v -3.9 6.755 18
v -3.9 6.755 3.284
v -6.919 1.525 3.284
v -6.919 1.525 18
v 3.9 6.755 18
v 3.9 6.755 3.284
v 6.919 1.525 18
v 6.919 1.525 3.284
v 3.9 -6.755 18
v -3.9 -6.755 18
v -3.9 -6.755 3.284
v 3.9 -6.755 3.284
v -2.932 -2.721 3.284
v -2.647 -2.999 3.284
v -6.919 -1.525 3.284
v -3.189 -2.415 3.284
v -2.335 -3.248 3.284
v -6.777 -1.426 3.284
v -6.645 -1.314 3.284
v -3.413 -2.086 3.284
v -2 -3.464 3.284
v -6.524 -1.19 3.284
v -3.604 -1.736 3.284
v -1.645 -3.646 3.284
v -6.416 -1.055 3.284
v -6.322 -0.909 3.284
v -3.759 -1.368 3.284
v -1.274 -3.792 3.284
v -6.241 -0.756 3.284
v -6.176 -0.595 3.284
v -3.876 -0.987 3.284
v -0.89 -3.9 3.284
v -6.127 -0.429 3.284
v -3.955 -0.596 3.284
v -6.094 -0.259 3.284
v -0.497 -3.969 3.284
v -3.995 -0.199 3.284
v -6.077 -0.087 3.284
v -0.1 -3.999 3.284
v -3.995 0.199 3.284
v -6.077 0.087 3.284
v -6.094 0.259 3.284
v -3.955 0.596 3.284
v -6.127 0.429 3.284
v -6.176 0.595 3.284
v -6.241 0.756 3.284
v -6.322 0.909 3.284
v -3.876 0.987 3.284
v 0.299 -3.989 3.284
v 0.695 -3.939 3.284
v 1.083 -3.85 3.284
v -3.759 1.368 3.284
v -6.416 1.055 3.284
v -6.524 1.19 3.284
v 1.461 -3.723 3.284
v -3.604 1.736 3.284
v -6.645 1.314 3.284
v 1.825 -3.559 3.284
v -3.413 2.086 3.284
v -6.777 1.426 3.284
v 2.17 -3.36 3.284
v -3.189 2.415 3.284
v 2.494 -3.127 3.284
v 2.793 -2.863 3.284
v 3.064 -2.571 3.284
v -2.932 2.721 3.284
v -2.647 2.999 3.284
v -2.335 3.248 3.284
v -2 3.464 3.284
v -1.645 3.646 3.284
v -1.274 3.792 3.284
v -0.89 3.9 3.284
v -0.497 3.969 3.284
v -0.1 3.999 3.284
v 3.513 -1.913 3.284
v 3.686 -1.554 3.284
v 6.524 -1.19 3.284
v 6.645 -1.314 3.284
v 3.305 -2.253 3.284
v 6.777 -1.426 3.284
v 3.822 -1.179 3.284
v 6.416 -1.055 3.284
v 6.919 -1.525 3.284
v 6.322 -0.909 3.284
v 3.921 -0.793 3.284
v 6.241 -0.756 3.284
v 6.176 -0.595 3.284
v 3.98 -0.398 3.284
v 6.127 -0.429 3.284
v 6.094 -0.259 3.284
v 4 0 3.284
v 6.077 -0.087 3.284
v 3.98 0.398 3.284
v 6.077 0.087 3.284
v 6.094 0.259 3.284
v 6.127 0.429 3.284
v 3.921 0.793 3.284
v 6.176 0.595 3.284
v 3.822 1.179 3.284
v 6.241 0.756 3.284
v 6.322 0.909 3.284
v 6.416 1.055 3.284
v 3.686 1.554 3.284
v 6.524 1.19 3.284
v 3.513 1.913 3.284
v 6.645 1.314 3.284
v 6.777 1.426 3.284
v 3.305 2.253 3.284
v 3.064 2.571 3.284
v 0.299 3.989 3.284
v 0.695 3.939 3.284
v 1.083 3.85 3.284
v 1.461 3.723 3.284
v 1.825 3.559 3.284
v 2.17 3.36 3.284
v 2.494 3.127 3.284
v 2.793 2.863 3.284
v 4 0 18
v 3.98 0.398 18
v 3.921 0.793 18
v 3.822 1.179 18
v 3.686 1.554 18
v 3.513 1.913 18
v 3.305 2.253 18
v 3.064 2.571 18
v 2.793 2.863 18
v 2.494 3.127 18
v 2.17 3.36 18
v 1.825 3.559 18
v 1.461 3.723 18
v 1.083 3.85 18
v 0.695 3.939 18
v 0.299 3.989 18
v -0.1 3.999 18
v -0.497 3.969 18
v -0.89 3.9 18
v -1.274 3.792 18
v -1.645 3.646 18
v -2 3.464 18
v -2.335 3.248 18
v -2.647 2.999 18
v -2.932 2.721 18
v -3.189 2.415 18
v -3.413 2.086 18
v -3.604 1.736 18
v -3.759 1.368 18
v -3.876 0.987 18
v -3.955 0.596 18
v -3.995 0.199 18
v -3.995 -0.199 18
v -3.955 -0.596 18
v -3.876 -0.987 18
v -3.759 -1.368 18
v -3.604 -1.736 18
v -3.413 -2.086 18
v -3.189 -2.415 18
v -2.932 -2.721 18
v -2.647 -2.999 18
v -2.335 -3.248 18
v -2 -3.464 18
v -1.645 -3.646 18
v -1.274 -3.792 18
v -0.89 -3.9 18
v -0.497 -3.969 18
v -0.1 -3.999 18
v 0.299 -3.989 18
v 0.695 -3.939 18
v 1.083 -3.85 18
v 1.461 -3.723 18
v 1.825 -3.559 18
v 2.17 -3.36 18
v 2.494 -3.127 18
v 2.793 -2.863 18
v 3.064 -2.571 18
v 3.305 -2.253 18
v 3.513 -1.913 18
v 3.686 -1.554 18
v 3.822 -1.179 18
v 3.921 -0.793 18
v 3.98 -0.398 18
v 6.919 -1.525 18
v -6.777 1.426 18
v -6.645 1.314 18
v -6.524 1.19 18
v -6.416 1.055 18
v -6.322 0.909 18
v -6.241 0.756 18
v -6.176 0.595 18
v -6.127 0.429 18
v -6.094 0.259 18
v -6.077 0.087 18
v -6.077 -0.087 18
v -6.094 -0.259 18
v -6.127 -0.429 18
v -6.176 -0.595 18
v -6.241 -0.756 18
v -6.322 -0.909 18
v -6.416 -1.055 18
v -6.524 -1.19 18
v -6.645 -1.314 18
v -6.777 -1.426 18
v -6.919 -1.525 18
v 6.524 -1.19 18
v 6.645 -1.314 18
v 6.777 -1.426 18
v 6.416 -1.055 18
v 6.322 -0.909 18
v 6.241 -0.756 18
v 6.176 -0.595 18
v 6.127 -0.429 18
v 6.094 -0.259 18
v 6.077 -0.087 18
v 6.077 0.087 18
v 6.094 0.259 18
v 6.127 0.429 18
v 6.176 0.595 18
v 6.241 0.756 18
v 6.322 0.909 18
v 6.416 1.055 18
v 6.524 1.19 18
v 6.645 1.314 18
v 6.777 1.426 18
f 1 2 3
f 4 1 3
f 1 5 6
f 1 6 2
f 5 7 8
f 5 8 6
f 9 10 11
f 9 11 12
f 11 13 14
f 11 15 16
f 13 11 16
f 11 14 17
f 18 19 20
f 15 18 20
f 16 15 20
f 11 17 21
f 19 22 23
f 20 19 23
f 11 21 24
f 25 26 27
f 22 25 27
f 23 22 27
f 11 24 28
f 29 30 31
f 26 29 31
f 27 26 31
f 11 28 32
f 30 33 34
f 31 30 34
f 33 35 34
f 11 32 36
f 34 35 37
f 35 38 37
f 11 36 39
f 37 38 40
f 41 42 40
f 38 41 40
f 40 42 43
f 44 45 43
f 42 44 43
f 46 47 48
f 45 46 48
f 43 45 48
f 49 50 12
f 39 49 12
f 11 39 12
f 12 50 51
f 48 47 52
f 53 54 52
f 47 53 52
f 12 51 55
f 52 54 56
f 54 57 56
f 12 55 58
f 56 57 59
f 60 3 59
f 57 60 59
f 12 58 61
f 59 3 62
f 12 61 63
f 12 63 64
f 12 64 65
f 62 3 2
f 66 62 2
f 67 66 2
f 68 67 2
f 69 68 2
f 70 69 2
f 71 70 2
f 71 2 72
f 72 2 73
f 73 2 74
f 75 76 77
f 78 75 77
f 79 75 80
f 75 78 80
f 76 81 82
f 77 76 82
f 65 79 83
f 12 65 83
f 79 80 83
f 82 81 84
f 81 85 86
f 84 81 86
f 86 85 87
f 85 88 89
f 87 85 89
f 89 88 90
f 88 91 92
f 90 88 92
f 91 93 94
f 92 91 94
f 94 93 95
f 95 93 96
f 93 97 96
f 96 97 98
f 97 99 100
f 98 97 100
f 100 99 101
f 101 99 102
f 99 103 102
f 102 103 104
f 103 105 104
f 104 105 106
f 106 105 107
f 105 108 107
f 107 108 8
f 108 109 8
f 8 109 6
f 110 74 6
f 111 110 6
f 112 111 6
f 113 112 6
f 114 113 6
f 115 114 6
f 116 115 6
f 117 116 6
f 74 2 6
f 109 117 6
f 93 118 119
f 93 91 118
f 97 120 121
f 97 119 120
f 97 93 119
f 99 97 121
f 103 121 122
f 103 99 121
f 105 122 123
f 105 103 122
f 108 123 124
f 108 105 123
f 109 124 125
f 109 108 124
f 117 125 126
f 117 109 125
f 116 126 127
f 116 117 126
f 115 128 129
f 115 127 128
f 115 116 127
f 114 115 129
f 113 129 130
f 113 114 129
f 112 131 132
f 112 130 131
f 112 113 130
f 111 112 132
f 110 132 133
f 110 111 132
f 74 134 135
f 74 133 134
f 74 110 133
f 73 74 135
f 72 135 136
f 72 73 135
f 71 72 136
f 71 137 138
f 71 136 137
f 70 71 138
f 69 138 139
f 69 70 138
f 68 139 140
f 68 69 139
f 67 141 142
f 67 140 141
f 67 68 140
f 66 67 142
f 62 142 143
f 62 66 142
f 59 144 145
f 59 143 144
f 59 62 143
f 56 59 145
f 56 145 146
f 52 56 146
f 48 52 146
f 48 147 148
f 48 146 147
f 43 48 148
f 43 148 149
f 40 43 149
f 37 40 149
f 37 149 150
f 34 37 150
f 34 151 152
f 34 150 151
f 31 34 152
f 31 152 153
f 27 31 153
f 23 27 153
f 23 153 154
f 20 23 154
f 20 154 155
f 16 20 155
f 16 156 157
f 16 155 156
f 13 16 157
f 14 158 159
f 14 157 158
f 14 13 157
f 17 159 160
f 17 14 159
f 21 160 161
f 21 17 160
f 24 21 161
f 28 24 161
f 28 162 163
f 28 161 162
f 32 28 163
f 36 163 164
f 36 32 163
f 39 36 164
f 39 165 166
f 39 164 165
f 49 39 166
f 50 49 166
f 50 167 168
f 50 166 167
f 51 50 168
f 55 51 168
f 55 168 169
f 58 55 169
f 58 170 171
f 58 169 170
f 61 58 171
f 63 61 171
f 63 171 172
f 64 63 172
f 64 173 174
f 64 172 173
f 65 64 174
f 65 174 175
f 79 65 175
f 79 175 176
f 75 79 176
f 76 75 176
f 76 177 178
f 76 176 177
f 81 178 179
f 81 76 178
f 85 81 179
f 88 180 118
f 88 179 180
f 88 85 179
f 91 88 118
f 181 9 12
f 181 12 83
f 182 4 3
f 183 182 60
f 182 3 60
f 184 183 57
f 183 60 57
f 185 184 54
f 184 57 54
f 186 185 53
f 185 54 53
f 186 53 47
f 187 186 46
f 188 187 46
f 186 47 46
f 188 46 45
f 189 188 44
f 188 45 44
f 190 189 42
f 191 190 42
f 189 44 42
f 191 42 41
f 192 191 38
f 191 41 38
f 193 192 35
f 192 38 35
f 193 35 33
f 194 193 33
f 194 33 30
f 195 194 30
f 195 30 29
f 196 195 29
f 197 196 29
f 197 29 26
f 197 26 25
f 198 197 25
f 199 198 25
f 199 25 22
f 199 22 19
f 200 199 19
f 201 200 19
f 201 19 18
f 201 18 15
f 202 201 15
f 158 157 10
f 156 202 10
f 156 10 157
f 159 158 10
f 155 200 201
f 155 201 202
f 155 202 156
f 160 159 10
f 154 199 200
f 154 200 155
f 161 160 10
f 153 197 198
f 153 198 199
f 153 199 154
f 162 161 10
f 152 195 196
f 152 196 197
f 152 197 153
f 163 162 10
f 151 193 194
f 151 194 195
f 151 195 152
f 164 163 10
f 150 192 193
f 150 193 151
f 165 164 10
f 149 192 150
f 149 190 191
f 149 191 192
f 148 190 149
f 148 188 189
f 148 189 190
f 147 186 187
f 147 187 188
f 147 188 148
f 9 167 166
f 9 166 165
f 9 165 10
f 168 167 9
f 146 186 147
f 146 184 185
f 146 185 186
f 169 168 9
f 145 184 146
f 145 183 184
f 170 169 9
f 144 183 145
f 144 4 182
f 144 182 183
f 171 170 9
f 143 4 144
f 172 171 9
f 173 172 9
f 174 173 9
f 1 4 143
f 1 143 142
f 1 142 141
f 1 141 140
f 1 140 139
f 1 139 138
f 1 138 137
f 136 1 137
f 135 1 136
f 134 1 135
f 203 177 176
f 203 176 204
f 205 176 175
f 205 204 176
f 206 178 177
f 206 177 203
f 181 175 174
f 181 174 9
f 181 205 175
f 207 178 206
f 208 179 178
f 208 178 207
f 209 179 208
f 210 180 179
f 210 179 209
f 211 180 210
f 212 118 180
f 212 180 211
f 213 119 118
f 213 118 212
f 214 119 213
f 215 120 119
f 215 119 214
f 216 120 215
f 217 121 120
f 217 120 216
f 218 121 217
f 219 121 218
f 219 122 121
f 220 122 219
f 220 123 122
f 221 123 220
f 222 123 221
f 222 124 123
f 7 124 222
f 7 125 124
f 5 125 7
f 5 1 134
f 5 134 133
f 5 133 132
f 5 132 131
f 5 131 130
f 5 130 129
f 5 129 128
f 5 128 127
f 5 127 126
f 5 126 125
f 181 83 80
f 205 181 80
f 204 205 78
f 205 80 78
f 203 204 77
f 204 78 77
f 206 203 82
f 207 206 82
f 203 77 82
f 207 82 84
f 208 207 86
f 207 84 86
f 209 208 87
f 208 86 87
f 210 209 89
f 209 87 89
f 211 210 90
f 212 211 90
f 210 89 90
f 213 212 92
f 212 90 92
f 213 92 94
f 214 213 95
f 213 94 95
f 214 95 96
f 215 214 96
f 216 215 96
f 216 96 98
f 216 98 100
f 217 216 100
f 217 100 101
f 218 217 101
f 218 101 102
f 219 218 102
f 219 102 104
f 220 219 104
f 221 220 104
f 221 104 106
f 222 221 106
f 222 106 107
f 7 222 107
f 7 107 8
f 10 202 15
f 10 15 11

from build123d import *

# Parameters (mm, degrees)
SKETCH1_R               = 17
BOSS_EXTRUDE1_DEPTH     = 4.4
CAVITY1_OUTLINE_R       = 3.15
CAVITY1_DEPTH           = 3.283595969
CAVITY1_START           = 1.183595969
CAVITY1_2_OUTLINE_R     = 3.15
CAVITY1_2_OUTLINE_R_2   = 1.575
CAVITY1_2_DEPTH         = 2.1
SKETCH9_R               = 12.8
BOSS_EXTRUDE3_DEPTH     = 5.6
BOSS_EXTRUDE8_DEPTH     = 8
SKETCH2_R               = 0.6
CUT_EXTRUDE1_DEPTH      = 31.033314835
CIRPATTERN1_COUNT       = 6
CUT_EXTRUDE2_START      = -3.283596
SKETCH3_R               = 4.596048158
CUT_EXTRUDE2_DEPTH      = 3.283596
CUT_EXTRUDE3_DEPTH      = 31.033314835
CUT_EXTRUDE3_DEPTH_BACK = 4
SKETCH4_R               = 4
SKETCH6_R               = 1.8
CUT_EXTRUDE4_DEPTH      = 31.033314835
SKETCH12_4_OUTSIDE_W    = 46.268
SKETCH12_4_OUTSIDE_H    = 46.268
CUT_EXTRUDE5_DEPTH      = 27.038433133


# Read off the part's stored shape, not the designer's step: Cavity1
with BuildPart() as part:
    # Sketch1 → Boss-Extrude1 (new body)
    with BuildSketch(Plane.XY):
        Circle(SKETCH1_R)
    extrude(amount=BOSS_EXTRUDE1_DEPTH)

    # Cavity1 outline → Cavity1 (cut)
    with BuildSketch(Plane.XY):
        with BuildLine():
            Line((3.9375, 6.819950055), (2.048148228, 15.163776711))
            ThreePointArc((2.048148228, 15.163776711), (0, 16.8), (-2.048148228, 15.163776711))
            Line((-2.048148228, 15.163776711), (-3.9375, 6.819950055))
            Line((-3.9375, 6.819950055), (-12.108141735, 9.355636751))
            ThreePointArc((-12.108141735, 9.355636751), (-14.549226784, 8.4), (-14.156289963, 5.80813996))
            Line((-14.156289963, 5.80813996), (-7.875, 0))
            Line((-7.875, 0), (-14.156289963, -5.80813996))
            ThreePointArc((-14.156289963, -5.80813996), (-14.549226784, -8.4), (-12.108141735, -9.355636751))
            Line((-12.108141735, -9.355636751), (-3.9375, -6.819950055))
            Line((-3.9375, -6.819950055), (-2.048148228, -15.163776711))
            ThreePointArc((-2.048148228, -15.163776711), (0, -16.8), (2.048148228, -15.163776711))
            Line((2.048148228, -15.163776711), (3.9375, -6.819950055))
            Line((3.9375, -6.819950055), (12.108141735, -9.355636751))
            ThreePointArc((12.108141735, -9.355636751), (14.549226784, -8.4), (14.156289963, -5.80813996))
            Line((14.156289963, -5.80813996), (7.875, 0))
            Line((7.875, 0), (14.156289963, 5.80813996))
            ThreePointArc((14.156289963, 5.80813996), (14.549226784, 8.4), (12.108141735, 9.355636751))
            Line((12.108141735, 9.355636751), (3.9375, 6.819950055))
        make_face()
        Circle(CAVITY1_OUTLINE_R, mode=Mode.SUBTRACT)
    extrude(amount=CAVITY1_DEPTH, mode=Mode.SUBTRACT)

    # Cavity1 2 outline → Cavity1 2 (cut)
    with BuildSketch(Plane.XY.offset(CAVITY1_START)):
        Circle(CAVITY1_2_OUTLINE_R)
        Circle(CAVITY1_2_OUTLINE_R_2, mode=Mode.SUBTRACT)
    extrude(amount=CAVITY1_2_DEPTH, mode=Mode.SUBTRACT)

    # Sketch9 → Boss-Extrude3 (add)
    with BuildSketch(Plane.XY.offset(4.4)):
        Circle(SKETCH9_R)
    extrude(amount=BOSS_EXTRUDE3_DEPTH)

    # Sketch12 → Boss-Extrude8 (add)
    with BuildSketch(Plane.XY.offset(10)):
        Polygon((3.9, -6.75499815), (7.8, 0), (3.9, 6.75499815), (-3.9, 6.75499815), (-7.8, 0), (-3.9, -6.75499815), align=None)
    extrude(amount=BOSS_EXTRUDE8_DEPTH)

    # Sketch2 → Cut-Extrude1 (cut, through all)
    with BuildSketch(Plane(origin=(0, 0, 0), x_dir=(-1, 0, 0), z_dir=(0, 0, -1))):
        with Locations(Location((0, 13.5, 0), (0, 0, 180))):
            Circle(SKETCH2_R)
        with Locations(Location((0, 10.5, 0), (0, 0, 180))):
            Circle(SKETCH2_R)
        with Locations(Location((0, 7.5, 0), (0, 0, 180))):
            Circle(SKETCH2_R)
    cut_extrude1 = extrude(amount=-CUT_EXTRUDE1_DEPTH, mode=Mode.SUBTRACT)

    # CirPattern1: Cut-Extrude1 ×6 about axis
    cirpattern1_axis = Axis((0, 0, 0), (0, 0, 1))
    for i in range(1, CIRPATTERN1_COUNT):
        add(cut_extrude1.rotate(cirpattern1_axis, i * 360 / CIRPATTERN1_COUNT), mode=Mode.SUBTRACT)

    # Sketch3 → Cut-Extrude2 (cut)
    with BuildSketch(Plane(origin=(0, 0, 0), x_dir=(-1, 0, 0), z_dir=(0, 0, -1)).offset(CUT_EXTRUDE2_START)):
        Circle(SKETCH3_R)
    extrude(amount=CUT_EXTRUDE2_DEPTH, mode=Mode.SUBTRACT)

    # Sketch4 → Cut-Extrude3 (cut, two sides: drawn at the far end of the back side and taken through both)
    with BuildSketch(Plane.XY.offset(-CUT_EXTRUDE3_DEPTH_BACK)):
        Circle(SKETCH4_R)
    extrude(amount=CUT_EXTRUDE3_DEPTH + CUT_EXTRUDE3_DEPTH_BACK, mode=Mode.SUBTRACT)

    # Sketch6 → Cut-Extrude4 (cut, through all)
    with BuildSketch(Plane(origin=(0, 0, 0), x_dir=(-1, 0, 0), z_dir=(0, 0, -1))):
        with Locations(Location((-7.875, 0, 0), (0, 0, 302.067932294))):
            Circle(SKETCH6_R)
        with Locations(Location((7.875, 0, 0), (0, 0, 42.758730598))):
            Circle(SKETCH6_R)
    extrude(amount=-CUT_EXTRUDE4_DEPTH, mode=Mode.SUBTRACT)

    # Sketch12<4> outside → Cut-Extrude5 (cut, through all)
    with BuildSketch(Plane.XY.offset(10)):
        Rectangle(SKETCH12_4_OUTSIDE_W, SKETCH12_4_OUTSIDE_H)
        Polygon((3.9, -6.75499815), (7.8, 0), (3.9, 6.75499815), (-3.9, 6.75499815), (-7.8, 0), (-3.9, -6.75499815), align=None, mode=Mode.SUBTRACT)
    extrude(amount=-CUT_EXTRUDE5_DEPTH, mode=Mode.SUBTRACT)


solid = part.part
